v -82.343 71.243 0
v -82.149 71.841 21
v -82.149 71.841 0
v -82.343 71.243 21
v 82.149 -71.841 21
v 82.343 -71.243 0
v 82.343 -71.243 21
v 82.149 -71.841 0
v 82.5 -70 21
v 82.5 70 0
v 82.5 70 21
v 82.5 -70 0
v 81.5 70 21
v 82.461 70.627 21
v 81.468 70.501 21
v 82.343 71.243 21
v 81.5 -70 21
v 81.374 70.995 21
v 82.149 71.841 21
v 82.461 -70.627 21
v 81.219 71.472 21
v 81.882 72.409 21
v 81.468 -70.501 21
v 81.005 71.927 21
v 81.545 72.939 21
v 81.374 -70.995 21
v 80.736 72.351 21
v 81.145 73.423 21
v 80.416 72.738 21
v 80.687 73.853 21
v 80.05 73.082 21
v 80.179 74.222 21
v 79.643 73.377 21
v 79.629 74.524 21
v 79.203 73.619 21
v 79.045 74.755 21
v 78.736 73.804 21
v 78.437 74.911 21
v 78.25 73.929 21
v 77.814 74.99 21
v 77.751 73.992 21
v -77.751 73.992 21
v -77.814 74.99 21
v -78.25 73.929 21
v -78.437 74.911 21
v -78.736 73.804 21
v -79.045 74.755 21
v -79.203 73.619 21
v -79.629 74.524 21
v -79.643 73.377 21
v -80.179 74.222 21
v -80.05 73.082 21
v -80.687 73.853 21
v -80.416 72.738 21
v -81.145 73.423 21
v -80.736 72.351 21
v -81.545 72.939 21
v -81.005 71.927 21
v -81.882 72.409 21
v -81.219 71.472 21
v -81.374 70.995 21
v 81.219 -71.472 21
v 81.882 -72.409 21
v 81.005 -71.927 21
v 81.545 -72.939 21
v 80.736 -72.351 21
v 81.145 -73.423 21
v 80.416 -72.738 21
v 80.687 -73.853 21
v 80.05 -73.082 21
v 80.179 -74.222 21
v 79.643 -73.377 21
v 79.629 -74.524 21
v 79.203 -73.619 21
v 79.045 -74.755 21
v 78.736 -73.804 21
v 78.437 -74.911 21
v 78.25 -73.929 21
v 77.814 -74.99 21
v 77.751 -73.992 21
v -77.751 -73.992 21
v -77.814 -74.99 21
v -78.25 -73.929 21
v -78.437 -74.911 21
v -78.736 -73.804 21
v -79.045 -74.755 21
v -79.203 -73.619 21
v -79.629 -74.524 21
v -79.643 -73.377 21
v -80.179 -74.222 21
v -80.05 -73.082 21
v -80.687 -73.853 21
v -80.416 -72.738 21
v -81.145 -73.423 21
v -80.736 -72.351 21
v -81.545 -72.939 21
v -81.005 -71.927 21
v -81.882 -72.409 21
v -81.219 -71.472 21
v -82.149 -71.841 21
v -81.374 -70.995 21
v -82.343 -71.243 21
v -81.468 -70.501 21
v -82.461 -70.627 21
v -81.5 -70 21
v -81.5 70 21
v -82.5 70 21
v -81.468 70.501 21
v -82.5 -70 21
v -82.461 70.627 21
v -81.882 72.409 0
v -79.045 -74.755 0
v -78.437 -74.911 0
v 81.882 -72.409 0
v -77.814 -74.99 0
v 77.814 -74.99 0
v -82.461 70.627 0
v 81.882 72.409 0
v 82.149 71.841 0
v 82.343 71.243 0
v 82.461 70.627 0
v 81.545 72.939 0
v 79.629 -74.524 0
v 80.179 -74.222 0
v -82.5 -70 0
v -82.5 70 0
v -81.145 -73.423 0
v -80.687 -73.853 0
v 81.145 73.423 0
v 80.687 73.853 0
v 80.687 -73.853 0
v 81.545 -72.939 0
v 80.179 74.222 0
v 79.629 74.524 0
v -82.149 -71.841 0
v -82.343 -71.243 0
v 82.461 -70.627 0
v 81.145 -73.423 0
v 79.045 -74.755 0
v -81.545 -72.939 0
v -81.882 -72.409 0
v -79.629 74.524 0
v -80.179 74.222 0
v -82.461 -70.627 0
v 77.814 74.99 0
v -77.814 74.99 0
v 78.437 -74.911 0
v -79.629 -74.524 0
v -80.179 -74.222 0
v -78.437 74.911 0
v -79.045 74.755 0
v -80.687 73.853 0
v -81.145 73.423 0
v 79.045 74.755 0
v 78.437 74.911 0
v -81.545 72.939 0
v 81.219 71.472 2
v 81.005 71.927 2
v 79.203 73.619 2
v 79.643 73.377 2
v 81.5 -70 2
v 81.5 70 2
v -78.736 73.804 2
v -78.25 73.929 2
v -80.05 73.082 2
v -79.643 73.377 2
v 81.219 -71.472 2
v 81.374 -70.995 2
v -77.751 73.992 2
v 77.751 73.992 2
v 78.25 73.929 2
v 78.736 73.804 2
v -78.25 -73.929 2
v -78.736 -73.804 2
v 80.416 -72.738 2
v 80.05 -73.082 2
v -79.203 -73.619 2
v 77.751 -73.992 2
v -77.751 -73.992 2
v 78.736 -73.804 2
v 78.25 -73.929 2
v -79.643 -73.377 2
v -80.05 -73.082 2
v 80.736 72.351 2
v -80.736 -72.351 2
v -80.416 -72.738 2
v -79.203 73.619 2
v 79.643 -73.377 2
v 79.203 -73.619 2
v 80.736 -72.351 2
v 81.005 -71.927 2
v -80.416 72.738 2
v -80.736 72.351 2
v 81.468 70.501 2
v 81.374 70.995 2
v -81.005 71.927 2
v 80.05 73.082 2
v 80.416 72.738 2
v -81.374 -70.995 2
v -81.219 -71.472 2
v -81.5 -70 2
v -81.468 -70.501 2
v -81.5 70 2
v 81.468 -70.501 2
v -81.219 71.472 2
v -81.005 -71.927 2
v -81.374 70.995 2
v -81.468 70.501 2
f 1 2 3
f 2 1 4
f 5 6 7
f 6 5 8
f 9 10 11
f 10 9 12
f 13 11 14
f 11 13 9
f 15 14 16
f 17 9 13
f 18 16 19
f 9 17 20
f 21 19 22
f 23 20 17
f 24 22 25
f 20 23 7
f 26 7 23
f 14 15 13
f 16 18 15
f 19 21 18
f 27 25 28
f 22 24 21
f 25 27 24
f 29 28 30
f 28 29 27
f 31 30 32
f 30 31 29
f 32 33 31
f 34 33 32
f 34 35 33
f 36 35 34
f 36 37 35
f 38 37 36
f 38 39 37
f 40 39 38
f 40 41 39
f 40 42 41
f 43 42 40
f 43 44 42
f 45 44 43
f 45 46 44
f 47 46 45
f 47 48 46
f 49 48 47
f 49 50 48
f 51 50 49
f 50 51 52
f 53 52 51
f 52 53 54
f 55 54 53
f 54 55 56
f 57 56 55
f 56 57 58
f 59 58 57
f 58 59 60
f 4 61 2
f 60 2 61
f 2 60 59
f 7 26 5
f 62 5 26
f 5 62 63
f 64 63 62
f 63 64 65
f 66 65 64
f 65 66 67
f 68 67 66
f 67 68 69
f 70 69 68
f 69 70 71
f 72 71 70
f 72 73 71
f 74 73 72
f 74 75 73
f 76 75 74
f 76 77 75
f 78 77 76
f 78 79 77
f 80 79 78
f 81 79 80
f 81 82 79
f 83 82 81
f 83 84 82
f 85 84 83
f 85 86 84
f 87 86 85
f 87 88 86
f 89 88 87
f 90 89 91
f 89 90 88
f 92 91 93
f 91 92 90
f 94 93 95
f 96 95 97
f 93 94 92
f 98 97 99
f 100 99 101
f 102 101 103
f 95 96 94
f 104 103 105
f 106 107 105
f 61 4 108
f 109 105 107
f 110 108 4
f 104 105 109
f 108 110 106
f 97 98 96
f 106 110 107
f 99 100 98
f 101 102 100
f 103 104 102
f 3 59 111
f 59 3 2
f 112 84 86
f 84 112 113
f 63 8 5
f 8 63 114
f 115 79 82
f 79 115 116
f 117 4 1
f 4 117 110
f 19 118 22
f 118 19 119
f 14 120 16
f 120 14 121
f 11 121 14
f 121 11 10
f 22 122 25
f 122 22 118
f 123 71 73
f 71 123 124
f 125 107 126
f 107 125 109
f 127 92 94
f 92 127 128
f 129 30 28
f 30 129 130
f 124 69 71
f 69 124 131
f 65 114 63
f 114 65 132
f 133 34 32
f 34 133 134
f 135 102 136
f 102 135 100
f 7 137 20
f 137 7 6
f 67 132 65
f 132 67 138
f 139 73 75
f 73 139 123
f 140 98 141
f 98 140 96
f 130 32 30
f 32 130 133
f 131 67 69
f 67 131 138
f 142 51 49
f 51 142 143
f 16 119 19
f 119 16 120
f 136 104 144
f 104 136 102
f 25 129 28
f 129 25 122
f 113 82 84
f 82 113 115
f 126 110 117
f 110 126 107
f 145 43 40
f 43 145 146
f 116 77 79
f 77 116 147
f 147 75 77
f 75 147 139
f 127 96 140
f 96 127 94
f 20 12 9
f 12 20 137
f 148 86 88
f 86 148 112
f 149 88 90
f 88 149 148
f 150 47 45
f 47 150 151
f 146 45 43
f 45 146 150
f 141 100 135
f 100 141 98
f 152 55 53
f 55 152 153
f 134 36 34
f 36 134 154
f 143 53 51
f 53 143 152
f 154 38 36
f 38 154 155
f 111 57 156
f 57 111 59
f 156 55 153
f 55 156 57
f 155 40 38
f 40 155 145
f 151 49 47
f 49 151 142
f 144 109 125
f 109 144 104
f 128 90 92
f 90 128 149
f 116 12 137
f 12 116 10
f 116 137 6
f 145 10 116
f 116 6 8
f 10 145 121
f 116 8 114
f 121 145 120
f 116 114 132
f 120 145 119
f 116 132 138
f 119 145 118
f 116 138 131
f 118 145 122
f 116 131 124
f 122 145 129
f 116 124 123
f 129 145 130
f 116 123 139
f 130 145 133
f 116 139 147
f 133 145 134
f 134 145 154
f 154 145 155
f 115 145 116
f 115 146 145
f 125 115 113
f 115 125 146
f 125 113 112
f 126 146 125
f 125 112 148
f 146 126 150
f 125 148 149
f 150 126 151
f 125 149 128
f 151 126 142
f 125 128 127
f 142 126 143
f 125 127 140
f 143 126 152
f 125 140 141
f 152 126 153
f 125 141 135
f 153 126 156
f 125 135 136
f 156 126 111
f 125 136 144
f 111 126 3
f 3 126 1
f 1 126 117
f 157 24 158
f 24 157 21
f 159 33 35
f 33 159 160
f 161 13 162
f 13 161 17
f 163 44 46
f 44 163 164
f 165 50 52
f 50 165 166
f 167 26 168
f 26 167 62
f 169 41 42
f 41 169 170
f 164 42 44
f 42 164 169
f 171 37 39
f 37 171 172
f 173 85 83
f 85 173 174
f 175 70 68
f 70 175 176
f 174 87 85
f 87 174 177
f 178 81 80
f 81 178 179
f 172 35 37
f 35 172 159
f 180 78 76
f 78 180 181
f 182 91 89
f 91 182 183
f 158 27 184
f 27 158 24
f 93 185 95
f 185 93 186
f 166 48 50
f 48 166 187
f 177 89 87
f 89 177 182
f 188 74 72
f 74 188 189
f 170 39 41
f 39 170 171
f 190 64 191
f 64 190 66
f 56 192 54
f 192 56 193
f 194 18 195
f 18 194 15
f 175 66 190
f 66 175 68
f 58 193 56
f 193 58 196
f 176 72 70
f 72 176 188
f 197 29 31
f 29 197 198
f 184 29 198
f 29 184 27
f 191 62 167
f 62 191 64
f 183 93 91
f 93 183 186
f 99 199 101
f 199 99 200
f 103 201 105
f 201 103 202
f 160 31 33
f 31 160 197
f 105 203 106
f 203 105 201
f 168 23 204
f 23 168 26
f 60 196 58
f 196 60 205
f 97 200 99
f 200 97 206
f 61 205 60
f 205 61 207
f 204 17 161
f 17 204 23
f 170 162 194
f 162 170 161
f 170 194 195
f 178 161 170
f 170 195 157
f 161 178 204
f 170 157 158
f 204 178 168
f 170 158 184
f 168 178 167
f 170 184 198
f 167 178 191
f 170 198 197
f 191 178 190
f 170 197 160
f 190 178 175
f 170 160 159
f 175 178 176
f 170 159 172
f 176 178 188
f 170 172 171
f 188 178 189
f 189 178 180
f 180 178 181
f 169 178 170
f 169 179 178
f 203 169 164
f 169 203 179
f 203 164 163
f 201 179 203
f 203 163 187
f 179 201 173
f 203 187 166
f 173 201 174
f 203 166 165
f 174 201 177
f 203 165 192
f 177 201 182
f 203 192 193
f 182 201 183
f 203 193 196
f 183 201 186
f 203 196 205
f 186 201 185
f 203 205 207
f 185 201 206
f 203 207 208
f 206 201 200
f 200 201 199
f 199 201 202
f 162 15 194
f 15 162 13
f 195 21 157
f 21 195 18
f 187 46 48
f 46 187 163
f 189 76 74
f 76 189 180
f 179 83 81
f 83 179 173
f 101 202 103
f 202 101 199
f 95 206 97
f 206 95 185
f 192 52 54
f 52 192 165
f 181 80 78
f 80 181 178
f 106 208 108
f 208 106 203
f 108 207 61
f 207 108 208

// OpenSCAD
$fn = 50;


difference() {
	union() {
		hull() {
			translate(v = [-77.5000000000, 70.0000000000, 0]) {
				cylinder(h = 21, r = 5);
			}
			translate(v = [77.5000000000, 70.0000000000, 0]) {
				cylinder(h = 21, r = 5);
			}
			translate(v = [-77.5000000000, -70.0000000000, 0]) {
				cylinder(h = 21, r = 5);
			}
			translate(v = [77.5000000000, -70.0000000000, 0]) {
				cylinder(h = 21, r = 5);
			}
		}
	}
	union() {
		translate(v = [0, 0, 2]) {
			hull() {
				translate(v = [-77.5000000000, 70.0000000000, 0]) {
					cylinder(h = 19, r = 4);
				}
				translate(v = [77.5000000000, 70.0000000000, 0]) {
					cylinder(h = 19, r = 4);
				}
				translate(v = [-77.5000000000, -70.0000000000, 0]) {
					cylinder(h = 19, r = 4);
				}
				translate(v = [77.5000000000, -70.0000000000, 0]) {
					cylinder(h = 19, r = 4);
				}
			}
		}
	}
}
